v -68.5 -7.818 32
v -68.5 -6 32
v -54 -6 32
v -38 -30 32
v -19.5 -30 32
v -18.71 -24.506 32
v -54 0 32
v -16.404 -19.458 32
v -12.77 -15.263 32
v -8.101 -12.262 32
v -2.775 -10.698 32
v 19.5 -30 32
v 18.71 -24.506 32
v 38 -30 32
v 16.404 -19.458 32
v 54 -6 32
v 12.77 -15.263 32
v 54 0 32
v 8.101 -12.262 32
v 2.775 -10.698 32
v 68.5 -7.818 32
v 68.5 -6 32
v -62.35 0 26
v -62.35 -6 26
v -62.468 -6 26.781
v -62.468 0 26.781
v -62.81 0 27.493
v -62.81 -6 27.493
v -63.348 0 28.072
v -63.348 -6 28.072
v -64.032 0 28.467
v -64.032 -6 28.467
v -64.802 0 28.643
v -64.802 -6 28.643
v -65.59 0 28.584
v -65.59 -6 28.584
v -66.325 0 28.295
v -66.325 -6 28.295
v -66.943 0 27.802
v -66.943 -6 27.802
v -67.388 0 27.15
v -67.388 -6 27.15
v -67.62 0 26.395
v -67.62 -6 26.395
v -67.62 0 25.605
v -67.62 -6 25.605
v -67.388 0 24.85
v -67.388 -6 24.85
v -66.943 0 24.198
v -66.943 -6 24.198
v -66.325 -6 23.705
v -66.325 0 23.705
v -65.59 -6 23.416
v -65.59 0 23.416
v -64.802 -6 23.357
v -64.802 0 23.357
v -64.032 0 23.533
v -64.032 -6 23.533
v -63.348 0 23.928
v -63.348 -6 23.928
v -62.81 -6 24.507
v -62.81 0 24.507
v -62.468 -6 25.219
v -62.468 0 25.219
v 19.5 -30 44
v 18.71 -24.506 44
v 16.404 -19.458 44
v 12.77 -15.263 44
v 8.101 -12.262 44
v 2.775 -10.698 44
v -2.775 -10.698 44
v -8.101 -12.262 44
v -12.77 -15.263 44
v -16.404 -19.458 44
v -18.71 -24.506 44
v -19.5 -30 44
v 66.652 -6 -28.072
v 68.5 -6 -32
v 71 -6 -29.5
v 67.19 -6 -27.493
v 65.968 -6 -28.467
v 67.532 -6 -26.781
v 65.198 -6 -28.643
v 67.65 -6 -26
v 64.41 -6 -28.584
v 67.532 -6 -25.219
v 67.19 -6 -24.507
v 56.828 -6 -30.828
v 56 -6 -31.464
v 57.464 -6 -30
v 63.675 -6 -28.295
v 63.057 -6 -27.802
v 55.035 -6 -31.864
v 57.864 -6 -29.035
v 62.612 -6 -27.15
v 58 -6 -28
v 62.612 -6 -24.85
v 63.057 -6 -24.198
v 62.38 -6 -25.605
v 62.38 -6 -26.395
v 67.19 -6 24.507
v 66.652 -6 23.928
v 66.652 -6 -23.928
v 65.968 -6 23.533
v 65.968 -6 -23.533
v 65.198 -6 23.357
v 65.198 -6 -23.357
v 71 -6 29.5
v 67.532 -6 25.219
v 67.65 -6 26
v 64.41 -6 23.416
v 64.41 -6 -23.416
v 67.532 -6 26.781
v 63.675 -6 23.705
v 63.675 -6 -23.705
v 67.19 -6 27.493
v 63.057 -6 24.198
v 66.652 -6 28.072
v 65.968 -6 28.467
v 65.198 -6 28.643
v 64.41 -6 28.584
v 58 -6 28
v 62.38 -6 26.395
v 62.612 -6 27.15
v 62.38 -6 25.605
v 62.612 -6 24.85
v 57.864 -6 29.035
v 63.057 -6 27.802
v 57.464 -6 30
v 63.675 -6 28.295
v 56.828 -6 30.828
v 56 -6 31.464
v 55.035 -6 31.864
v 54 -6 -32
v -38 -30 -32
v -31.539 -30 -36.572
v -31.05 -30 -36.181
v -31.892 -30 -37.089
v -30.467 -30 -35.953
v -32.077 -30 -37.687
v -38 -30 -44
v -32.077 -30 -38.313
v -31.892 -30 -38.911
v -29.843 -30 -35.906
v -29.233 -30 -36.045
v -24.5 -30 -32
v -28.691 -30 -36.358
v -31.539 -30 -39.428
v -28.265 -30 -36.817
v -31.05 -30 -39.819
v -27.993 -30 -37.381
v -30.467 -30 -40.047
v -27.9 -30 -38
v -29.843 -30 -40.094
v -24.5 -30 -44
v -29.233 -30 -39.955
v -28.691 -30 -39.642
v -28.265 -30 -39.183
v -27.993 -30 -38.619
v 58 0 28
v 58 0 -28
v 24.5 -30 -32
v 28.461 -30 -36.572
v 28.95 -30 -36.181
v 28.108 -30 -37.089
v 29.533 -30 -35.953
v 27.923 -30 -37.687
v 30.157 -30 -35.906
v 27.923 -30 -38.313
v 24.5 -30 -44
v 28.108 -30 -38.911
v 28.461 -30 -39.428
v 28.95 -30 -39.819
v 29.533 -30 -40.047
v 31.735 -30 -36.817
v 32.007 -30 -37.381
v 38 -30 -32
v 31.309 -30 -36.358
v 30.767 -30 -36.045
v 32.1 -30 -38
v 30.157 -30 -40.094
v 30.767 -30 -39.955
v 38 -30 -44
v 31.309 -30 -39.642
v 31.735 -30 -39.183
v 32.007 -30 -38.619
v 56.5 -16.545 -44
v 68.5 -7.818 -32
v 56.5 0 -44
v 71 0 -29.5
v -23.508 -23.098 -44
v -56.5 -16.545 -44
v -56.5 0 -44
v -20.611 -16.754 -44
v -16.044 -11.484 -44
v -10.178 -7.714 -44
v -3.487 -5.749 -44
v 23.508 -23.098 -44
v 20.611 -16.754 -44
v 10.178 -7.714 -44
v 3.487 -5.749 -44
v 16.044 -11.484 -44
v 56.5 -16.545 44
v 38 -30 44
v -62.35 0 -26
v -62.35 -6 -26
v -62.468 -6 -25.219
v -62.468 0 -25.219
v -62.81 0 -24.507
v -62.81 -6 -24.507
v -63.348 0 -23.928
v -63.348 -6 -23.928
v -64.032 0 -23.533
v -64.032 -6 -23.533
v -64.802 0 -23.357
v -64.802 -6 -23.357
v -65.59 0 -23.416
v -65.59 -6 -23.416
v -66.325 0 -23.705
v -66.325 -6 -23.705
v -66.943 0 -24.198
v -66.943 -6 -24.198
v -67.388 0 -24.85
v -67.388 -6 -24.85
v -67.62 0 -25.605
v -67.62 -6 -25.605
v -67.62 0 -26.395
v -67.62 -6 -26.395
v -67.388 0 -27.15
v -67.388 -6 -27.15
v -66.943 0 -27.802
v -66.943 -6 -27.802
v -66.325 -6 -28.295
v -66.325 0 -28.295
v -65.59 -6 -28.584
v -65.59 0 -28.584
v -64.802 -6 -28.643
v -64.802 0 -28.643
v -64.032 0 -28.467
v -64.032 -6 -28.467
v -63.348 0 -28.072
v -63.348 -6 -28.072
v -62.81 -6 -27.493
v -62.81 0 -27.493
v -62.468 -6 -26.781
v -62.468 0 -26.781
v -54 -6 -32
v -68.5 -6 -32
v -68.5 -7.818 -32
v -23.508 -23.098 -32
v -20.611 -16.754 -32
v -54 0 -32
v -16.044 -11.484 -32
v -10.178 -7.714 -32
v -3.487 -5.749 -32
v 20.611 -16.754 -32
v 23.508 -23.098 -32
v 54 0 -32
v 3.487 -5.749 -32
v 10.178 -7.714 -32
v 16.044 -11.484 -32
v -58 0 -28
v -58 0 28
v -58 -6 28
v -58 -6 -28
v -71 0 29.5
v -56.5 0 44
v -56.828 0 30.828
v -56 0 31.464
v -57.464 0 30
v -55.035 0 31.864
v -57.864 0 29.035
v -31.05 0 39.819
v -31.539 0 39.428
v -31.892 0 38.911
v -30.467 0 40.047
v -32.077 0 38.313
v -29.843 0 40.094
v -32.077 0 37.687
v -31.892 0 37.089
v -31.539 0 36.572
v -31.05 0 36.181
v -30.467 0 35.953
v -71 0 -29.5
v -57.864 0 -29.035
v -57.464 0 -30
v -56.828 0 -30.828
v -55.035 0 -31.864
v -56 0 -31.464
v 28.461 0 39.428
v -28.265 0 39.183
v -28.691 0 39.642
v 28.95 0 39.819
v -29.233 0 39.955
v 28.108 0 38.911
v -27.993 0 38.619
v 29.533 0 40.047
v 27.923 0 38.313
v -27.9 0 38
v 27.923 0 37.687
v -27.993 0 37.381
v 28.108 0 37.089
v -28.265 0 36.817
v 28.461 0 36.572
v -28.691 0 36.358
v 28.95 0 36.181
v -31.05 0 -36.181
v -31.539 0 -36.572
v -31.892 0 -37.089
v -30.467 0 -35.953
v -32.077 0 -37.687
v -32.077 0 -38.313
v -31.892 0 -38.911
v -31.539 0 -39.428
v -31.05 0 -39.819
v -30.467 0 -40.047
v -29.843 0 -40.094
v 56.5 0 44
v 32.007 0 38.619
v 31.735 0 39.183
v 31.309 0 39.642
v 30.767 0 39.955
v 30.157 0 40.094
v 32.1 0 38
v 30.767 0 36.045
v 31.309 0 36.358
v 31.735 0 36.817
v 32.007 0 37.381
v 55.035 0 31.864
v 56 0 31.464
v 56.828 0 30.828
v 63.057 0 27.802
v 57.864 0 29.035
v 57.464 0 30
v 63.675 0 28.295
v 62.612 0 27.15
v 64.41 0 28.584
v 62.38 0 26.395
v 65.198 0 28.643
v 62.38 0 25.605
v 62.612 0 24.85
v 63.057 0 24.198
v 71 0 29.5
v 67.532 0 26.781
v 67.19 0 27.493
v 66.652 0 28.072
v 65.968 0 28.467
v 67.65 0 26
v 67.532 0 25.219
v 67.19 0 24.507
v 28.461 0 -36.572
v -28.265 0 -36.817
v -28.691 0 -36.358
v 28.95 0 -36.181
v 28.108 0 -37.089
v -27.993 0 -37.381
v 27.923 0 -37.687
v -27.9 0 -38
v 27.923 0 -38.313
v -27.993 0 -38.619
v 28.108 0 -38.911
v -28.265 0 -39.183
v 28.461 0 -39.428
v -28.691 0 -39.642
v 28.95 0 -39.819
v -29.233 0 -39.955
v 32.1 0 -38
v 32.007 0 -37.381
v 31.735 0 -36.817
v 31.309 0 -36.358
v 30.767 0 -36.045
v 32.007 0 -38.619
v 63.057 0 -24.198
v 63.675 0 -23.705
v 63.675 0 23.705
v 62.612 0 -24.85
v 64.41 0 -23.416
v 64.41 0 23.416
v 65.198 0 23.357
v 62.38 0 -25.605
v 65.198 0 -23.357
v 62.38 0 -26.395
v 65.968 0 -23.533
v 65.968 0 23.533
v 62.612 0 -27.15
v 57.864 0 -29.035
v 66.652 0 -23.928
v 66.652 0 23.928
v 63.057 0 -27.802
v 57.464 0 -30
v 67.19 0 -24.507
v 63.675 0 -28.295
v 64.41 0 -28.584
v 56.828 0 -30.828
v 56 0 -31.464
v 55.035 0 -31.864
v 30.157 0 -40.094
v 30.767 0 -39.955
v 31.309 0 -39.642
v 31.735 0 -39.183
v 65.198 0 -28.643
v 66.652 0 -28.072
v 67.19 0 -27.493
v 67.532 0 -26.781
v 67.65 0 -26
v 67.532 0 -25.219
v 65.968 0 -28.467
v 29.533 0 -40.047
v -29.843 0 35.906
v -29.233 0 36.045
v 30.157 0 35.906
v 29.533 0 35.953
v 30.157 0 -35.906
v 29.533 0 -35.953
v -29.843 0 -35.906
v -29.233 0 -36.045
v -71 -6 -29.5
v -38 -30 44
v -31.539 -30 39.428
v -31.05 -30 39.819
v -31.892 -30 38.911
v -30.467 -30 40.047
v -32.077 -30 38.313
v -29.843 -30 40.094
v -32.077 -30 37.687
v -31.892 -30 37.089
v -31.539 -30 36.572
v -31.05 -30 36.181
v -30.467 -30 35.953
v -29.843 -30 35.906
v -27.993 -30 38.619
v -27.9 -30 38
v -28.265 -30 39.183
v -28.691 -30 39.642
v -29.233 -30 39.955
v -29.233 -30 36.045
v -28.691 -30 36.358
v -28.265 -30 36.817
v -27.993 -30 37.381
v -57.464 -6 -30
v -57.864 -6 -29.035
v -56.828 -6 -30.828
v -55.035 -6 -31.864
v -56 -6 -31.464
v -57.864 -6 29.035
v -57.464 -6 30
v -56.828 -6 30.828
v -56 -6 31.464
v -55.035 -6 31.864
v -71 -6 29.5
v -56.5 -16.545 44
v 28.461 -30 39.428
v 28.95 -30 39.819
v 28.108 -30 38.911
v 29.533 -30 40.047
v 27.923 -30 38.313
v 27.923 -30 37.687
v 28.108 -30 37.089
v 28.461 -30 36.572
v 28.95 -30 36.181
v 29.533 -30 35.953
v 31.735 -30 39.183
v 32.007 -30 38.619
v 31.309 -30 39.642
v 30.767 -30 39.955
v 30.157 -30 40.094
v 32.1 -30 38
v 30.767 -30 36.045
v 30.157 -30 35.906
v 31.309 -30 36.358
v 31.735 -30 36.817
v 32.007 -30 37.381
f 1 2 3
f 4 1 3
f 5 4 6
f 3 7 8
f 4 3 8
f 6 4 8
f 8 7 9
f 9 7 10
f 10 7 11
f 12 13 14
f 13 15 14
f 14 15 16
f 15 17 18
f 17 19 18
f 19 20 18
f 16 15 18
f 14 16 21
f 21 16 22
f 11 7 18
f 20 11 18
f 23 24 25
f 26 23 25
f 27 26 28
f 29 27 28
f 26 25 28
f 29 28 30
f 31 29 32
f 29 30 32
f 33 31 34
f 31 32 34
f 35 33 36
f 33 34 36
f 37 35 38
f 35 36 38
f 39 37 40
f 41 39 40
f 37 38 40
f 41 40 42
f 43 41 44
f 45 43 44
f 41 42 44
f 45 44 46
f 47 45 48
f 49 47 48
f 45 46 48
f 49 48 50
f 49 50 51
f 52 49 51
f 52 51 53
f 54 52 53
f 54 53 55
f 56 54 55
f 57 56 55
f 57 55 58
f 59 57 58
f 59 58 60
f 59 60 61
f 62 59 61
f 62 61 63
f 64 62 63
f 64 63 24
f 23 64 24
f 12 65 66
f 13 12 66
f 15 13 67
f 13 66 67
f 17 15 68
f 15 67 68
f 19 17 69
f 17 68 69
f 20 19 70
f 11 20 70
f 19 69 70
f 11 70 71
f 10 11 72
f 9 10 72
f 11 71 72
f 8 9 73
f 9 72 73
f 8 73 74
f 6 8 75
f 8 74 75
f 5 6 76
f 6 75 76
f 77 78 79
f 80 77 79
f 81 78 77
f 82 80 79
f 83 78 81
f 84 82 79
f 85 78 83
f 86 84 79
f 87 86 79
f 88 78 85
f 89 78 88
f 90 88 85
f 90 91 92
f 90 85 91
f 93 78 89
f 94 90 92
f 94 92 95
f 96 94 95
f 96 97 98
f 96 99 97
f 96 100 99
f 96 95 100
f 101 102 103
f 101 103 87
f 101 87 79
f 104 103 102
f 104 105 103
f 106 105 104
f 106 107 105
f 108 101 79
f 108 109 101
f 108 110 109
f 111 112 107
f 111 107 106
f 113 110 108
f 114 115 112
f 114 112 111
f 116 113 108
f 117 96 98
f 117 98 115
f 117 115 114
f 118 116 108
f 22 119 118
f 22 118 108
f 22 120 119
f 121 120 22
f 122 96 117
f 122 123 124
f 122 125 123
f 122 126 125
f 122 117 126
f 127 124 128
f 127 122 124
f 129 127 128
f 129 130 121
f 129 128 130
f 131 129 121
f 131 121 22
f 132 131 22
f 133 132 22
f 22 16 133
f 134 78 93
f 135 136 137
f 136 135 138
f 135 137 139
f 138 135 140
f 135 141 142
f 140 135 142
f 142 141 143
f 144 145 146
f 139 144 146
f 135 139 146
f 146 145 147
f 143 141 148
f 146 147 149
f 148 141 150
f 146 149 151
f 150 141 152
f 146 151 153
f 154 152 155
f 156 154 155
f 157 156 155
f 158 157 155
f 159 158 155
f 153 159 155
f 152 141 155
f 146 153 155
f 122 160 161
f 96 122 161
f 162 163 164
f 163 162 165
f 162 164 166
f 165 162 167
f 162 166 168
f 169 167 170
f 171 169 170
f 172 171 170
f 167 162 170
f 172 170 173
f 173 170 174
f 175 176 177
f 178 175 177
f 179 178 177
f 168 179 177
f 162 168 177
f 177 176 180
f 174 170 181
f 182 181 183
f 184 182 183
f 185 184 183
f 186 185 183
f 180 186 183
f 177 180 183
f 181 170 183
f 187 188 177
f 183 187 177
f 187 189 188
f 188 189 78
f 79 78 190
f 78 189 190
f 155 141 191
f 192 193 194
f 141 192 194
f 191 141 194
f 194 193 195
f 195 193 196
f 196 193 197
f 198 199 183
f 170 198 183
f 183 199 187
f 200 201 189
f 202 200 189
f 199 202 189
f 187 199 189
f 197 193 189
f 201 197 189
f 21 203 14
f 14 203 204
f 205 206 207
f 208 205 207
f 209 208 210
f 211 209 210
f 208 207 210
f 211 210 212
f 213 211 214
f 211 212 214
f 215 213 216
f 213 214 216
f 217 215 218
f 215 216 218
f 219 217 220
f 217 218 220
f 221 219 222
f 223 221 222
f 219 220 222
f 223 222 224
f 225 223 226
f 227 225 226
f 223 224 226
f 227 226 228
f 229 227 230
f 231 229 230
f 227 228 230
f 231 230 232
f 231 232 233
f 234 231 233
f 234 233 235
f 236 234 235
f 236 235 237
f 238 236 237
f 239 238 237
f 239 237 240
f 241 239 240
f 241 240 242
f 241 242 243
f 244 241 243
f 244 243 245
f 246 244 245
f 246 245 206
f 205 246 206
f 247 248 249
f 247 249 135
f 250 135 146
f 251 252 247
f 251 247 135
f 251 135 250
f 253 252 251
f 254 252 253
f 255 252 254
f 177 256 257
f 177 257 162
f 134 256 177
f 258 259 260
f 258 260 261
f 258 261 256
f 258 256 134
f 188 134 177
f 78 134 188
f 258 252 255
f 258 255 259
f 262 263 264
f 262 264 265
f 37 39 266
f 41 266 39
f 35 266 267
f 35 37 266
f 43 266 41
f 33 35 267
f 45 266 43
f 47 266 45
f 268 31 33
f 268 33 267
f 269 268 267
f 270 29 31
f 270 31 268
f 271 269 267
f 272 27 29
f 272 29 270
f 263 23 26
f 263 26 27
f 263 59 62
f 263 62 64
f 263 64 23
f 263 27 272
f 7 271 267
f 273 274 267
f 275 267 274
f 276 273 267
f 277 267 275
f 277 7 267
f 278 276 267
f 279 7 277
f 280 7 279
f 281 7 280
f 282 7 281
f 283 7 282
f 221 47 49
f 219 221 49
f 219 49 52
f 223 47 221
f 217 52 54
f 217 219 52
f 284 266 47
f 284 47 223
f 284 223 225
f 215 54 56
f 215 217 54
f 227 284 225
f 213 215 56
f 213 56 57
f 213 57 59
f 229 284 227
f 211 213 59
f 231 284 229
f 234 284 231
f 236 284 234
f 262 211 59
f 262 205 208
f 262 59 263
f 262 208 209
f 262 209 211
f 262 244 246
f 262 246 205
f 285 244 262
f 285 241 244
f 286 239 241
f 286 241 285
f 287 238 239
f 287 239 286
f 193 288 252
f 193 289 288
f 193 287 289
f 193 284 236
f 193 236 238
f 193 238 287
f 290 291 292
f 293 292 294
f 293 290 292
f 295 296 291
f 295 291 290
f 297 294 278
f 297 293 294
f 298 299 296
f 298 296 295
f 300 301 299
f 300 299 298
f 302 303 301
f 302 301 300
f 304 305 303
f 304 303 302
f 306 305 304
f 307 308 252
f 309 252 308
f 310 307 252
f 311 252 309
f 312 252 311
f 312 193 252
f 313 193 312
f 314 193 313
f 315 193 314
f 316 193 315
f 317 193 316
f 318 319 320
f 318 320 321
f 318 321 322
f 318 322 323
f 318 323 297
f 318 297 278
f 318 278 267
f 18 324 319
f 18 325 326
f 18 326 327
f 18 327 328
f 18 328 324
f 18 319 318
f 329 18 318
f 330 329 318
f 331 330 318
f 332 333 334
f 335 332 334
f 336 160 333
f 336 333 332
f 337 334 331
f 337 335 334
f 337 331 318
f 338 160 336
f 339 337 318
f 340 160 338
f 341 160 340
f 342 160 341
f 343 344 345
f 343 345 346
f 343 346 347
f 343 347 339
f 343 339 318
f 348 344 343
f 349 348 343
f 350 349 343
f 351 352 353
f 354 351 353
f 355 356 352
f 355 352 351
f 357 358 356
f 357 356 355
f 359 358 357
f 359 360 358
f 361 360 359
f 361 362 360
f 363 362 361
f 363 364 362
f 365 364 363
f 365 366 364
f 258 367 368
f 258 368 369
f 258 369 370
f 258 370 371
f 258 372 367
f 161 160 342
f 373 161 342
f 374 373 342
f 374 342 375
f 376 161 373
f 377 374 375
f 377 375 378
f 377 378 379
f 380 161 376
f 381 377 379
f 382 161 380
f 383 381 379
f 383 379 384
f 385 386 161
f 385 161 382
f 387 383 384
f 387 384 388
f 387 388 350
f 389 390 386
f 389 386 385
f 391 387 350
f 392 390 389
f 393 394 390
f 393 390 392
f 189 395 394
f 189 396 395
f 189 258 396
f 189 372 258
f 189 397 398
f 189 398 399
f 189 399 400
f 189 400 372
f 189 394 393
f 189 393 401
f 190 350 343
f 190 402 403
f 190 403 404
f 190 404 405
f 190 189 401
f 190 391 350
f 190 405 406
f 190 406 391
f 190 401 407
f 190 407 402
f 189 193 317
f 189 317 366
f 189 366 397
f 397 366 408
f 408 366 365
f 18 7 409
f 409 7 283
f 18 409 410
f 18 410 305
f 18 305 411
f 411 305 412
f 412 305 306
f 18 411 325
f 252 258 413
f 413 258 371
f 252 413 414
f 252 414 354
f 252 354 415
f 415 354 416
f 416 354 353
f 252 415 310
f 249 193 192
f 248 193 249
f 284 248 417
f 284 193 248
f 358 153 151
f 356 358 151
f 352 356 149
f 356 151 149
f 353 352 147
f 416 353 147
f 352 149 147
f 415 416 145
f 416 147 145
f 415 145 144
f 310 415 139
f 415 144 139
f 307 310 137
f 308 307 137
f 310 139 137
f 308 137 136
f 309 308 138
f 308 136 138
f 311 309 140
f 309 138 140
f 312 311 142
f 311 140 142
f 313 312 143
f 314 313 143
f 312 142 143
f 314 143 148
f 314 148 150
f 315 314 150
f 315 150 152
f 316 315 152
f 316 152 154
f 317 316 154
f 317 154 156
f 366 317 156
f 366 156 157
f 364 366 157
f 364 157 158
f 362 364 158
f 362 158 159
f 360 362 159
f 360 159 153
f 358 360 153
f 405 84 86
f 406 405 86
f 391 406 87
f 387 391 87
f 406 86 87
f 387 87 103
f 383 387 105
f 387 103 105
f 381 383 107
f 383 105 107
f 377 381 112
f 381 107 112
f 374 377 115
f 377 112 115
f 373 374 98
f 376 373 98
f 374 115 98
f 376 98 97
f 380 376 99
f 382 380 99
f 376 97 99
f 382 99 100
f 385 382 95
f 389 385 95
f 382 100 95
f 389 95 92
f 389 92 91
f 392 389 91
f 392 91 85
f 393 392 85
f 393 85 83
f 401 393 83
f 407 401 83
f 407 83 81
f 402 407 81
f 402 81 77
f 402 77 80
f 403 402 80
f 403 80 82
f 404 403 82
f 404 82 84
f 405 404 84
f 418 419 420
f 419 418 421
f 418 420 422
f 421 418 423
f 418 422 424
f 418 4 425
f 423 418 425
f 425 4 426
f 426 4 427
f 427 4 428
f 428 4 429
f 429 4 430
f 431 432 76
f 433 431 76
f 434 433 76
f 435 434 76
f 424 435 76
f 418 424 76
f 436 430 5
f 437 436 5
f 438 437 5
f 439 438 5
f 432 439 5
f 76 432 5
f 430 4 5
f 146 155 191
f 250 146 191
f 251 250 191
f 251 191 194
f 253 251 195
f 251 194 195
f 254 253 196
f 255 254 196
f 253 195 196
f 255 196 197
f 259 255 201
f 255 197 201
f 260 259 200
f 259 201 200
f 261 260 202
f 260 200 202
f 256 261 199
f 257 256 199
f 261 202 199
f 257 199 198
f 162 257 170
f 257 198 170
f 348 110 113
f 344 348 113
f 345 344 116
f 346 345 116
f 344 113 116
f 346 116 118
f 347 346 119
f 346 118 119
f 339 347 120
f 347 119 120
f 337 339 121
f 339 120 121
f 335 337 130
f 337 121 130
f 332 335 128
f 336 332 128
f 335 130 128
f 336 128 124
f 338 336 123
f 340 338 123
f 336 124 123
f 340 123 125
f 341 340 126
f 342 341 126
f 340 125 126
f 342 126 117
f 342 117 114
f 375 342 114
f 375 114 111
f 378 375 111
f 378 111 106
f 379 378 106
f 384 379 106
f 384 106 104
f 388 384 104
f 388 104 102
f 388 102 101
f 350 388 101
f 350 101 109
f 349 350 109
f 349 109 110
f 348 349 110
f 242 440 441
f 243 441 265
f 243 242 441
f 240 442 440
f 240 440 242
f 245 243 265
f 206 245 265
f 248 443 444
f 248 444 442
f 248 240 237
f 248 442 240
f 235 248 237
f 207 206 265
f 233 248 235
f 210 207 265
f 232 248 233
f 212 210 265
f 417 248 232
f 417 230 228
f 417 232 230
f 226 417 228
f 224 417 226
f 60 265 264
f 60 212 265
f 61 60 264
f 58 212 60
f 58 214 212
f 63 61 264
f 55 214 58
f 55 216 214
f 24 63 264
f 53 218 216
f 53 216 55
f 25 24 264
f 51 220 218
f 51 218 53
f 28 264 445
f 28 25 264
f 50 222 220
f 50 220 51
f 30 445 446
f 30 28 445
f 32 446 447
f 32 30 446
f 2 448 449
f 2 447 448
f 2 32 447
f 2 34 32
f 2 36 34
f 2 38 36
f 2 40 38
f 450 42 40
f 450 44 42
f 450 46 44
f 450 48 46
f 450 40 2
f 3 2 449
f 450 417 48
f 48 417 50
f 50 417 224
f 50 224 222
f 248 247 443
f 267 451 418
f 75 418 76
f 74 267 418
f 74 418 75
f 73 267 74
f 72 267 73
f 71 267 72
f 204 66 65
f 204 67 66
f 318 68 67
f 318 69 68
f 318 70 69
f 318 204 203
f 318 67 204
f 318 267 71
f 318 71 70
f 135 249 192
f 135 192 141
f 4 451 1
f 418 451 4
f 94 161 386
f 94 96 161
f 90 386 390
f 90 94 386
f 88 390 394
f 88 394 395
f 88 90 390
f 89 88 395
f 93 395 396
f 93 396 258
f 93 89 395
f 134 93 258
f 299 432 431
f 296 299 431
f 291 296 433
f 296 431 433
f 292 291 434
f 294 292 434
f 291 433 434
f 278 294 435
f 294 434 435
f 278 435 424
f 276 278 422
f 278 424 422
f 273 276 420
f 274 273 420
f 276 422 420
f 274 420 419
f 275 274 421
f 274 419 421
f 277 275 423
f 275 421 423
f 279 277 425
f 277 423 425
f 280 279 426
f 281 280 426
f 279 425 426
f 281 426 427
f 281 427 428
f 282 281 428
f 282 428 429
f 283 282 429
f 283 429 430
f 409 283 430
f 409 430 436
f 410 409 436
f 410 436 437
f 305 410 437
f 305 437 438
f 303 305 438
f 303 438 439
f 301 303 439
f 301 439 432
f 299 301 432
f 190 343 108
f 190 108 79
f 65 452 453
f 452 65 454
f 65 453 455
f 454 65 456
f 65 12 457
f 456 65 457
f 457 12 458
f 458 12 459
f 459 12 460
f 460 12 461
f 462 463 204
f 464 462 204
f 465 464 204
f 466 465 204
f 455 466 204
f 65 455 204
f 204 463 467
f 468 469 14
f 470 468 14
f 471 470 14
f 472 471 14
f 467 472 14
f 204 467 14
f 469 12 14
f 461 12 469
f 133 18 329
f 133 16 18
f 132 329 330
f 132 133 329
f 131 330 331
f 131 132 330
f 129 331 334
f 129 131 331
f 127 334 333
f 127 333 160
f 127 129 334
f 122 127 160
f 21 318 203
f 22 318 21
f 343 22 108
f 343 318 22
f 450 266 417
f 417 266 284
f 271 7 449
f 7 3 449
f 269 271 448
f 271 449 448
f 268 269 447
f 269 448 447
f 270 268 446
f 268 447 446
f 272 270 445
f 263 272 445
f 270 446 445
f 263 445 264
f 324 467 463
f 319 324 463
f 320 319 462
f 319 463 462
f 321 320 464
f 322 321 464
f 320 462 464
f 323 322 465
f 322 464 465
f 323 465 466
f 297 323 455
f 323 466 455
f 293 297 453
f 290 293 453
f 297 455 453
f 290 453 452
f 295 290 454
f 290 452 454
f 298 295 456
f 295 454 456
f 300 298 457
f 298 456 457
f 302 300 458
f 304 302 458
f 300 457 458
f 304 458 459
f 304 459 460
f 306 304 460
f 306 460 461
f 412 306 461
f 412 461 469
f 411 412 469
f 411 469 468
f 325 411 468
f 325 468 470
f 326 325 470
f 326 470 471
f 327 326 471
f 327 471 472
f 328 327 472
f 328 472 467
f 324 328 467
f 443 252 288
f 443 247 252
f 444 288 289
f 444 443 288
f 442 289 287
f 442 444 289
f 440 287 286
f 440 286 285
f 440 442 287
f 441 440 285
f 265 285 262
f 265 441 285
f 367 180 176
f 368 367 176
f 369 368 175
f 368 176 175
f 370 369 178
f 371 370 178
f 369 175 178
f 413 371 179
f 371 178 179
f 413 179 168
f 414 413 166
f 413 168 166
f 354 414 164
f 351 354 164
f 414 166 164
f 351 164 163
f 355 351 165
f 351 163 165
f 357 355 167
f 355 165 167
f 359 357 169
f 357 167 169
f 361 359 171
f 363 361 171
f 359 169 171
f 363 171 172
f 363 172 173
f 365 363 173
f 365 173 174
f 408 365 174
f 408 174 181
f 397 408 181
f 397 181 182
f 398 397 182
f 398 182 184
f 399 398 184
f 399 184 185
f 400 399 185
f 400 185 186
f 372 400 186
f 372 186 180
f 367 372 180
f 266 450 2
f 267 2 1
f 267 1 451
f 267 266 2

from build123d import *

# Parameters (mm, degrees)
SKETCH_1_W          = 142
SKETCH_1_H          = 88
SKETCH_1_W_2        = 116
SKETCH_1_H_2        = 64
EXTRUDE_1_DEPTH     = 30
CUT_EXTRUDE_1_DEPTH = 117.982904734
SKETCH_4_W          = 64
SKETCH_4_H          = 16.727272727
CUT_EXTRUDE_2_DEPTH = 152.657508881
FILLET_3_R          = 4
CHAMFER_2_SIZE      = 14.5
CUT_EXTRUDE_4_REACH = 118.983
SKETCH_8_R          = 19.5
CUT_EXTRUDE_5_REACH = 118.983
SKETCH_9_R          = 24.5
F_4_X_M5_D          = 4.2
F_4_X_M5_2_D        = 5.3


with BuildPart() as part:
    # 草图1 → 凸台-拉伸1 (new body)
    with BuildSketch(Plane(origin=(0, 0, 0), x_dir=(1, 0, 0), z_dir=(0, 1, 0))):
        Rectangle(SKETCH_1_W, SKETCH_1_H)
        Rectangle(SKETCH_1_W_2, SKETCH_1_H_2, mode=Mode.SUBTRACT)
    extrude(amount=-EXTRUDE_1_DEPTH)

    # 草图2 → 切除-拉伸1 (cut, through all)
    with BuildSketch(Plane.XY.offset(44)):
        Polygon((71, -6), (38, -30), (71, -30), align=None)
        Polygon((-71, -30), (-71, -6), (-38, -30), align=None)
    extrude(amount=-CUT_EXTRUDE_1_DEPTH, mode=Mode.SUBTRACT)

    # 草图4 → 切除-拉伸2 (cut, through all)
    with BuildSketch(Plane.ZY.offset(71)):
        with Locations((0, -14.363636364)):
            Rectangle(SKETCH_4_W, SKETCH_4_H)
    extrude(amount=-CUT_EXTRUDE_2_DEPTH, mode=Mode.SUBTRACT)

    # 圆角3
    fillet_3_edges = [part.edges().sort_by_distance(p)[0] for p in [
        (58, -3, -32),
        (58, -3, 32),
        (-58, -3, 32),
        (-58, -3, -32),
    ]]
    fillet(fillet_3_edges, radius=FILLET_3_R)

    # 倒角2
    # the kernel refuses this chamfer: 14.5 mm, written as the material it takes off along each edge
    with BuildSketch(Plane(origin=(71, 37.289403326, 44), x_dir=(-0.9996219169112966, 0, 0.027495876610586445), z_dir=(0, -1, 0)), Plane(origin=(-71, 37.289403326, 44), x_dir=(-0.02749587661058598, 0, -0.9996219169112966), z_dir=(0, -1, 0)), Plane(origin=(-71, 37.289403326, -44), x_dir=(0.9996219169112966, 0, -0.027495876610586455), z_dir=(0, -1, 0))) as chamfer_2_piece_1:
        Polygon((CHAMFER_2_SIZE * 0.999621916911, CHAMFER_2_SIZE * 0.0274958766106), (-CHAMFER_2_SIZE * 0.0274958766106, CHAMFER_2_SIZE * 0.999621916911), (0, 0), align=None)
    extrude(amount=80.578806651, mode=Mode.SUBTRACT)
    with BuildSketch(Plane(origin=(71, 37.289403326, -44), x_dir=(-0.9996219169112966, 0, -0.027495876610586455), z_dir=(0, -1, 0))) as chamfer_2_piece_2:
        Polygon((CHAMFER_2_SIZE * 0.999621916911, -CHAMFER_2_SIZE * 0.0274958766106), (-CHAMFER_2_SIZE * 0.0274958766106, -CHAMFER_2_SIZE * 0.999621916911), (0, 0), align=None)
    extrude(amount=80.578806651, mode=Mode.SUBTRACT)

    # 草图8 → 切除-拉伸4 (cut, up to next)
    with BuildSketch(Plane.XY.offset(44), mode=Mode.PRIVATE) as cut_extrude_4_sk1:
        with Locations((0, -30)):
            Circle(SKETCH_8_R)
    cut_extrude_4_tool1 = extrude(cut_extrude_4_sk1.sketch, amount=-CUT_EXTRUDE_4_REACH, mode=Mode.PRIVATE) & part.part
    add(cut_extrude_4_tool1.solids().sort_by_distance((0, -30, 44))[0], mode=Mode.SUBTRACT)

    # 草图9 → 切除-拉伸5 (cut, up to next)
    with BuildSketch(Plane(origin=(0, 0, -44), x_dir=(-1, 0, 0), z_dir=(0, 0, -1)), mode=Mode.PRIVATE) as cut_extrude_5_sk1:
        with Locations((0, -30)):
            Circle(SKETCH_9_R)
    cut_extrude_5_tool1 = extrude(cut_extrude_5_sk1.sketch, amount=-CUT_EXTRUDE_5_REACH, mode=Mode.PRIVATE) & part.part
    add(cut_extrude_5_tool1.solids().sort_by_distance((0, -30, -44))[0], mode=Mode.SUBTRACT)

    # 4 x M5 (through all)
    with Locations(Plane(origin=(0, 0, 0), x_dir=(-1, 0, 0), z_dir=(0, 1, 0))):
        with Locations((30, -38), (-30, -38), (-30, 38), (30, 38)):
            Hole(F_4_X_M5_D / 2)

    # 4 x M5 2 (through all)
    with Locations(Plane(origin=(0, 0, 0), x_dir=(-1, 0, 0), z_dir=(0, 1, 0))):
        with Locations((65, -26), (-65, -26), (65, 26), (-65, 26)):
            Hole(F_4_X_M5_2_D / 2)


solid = part.part
